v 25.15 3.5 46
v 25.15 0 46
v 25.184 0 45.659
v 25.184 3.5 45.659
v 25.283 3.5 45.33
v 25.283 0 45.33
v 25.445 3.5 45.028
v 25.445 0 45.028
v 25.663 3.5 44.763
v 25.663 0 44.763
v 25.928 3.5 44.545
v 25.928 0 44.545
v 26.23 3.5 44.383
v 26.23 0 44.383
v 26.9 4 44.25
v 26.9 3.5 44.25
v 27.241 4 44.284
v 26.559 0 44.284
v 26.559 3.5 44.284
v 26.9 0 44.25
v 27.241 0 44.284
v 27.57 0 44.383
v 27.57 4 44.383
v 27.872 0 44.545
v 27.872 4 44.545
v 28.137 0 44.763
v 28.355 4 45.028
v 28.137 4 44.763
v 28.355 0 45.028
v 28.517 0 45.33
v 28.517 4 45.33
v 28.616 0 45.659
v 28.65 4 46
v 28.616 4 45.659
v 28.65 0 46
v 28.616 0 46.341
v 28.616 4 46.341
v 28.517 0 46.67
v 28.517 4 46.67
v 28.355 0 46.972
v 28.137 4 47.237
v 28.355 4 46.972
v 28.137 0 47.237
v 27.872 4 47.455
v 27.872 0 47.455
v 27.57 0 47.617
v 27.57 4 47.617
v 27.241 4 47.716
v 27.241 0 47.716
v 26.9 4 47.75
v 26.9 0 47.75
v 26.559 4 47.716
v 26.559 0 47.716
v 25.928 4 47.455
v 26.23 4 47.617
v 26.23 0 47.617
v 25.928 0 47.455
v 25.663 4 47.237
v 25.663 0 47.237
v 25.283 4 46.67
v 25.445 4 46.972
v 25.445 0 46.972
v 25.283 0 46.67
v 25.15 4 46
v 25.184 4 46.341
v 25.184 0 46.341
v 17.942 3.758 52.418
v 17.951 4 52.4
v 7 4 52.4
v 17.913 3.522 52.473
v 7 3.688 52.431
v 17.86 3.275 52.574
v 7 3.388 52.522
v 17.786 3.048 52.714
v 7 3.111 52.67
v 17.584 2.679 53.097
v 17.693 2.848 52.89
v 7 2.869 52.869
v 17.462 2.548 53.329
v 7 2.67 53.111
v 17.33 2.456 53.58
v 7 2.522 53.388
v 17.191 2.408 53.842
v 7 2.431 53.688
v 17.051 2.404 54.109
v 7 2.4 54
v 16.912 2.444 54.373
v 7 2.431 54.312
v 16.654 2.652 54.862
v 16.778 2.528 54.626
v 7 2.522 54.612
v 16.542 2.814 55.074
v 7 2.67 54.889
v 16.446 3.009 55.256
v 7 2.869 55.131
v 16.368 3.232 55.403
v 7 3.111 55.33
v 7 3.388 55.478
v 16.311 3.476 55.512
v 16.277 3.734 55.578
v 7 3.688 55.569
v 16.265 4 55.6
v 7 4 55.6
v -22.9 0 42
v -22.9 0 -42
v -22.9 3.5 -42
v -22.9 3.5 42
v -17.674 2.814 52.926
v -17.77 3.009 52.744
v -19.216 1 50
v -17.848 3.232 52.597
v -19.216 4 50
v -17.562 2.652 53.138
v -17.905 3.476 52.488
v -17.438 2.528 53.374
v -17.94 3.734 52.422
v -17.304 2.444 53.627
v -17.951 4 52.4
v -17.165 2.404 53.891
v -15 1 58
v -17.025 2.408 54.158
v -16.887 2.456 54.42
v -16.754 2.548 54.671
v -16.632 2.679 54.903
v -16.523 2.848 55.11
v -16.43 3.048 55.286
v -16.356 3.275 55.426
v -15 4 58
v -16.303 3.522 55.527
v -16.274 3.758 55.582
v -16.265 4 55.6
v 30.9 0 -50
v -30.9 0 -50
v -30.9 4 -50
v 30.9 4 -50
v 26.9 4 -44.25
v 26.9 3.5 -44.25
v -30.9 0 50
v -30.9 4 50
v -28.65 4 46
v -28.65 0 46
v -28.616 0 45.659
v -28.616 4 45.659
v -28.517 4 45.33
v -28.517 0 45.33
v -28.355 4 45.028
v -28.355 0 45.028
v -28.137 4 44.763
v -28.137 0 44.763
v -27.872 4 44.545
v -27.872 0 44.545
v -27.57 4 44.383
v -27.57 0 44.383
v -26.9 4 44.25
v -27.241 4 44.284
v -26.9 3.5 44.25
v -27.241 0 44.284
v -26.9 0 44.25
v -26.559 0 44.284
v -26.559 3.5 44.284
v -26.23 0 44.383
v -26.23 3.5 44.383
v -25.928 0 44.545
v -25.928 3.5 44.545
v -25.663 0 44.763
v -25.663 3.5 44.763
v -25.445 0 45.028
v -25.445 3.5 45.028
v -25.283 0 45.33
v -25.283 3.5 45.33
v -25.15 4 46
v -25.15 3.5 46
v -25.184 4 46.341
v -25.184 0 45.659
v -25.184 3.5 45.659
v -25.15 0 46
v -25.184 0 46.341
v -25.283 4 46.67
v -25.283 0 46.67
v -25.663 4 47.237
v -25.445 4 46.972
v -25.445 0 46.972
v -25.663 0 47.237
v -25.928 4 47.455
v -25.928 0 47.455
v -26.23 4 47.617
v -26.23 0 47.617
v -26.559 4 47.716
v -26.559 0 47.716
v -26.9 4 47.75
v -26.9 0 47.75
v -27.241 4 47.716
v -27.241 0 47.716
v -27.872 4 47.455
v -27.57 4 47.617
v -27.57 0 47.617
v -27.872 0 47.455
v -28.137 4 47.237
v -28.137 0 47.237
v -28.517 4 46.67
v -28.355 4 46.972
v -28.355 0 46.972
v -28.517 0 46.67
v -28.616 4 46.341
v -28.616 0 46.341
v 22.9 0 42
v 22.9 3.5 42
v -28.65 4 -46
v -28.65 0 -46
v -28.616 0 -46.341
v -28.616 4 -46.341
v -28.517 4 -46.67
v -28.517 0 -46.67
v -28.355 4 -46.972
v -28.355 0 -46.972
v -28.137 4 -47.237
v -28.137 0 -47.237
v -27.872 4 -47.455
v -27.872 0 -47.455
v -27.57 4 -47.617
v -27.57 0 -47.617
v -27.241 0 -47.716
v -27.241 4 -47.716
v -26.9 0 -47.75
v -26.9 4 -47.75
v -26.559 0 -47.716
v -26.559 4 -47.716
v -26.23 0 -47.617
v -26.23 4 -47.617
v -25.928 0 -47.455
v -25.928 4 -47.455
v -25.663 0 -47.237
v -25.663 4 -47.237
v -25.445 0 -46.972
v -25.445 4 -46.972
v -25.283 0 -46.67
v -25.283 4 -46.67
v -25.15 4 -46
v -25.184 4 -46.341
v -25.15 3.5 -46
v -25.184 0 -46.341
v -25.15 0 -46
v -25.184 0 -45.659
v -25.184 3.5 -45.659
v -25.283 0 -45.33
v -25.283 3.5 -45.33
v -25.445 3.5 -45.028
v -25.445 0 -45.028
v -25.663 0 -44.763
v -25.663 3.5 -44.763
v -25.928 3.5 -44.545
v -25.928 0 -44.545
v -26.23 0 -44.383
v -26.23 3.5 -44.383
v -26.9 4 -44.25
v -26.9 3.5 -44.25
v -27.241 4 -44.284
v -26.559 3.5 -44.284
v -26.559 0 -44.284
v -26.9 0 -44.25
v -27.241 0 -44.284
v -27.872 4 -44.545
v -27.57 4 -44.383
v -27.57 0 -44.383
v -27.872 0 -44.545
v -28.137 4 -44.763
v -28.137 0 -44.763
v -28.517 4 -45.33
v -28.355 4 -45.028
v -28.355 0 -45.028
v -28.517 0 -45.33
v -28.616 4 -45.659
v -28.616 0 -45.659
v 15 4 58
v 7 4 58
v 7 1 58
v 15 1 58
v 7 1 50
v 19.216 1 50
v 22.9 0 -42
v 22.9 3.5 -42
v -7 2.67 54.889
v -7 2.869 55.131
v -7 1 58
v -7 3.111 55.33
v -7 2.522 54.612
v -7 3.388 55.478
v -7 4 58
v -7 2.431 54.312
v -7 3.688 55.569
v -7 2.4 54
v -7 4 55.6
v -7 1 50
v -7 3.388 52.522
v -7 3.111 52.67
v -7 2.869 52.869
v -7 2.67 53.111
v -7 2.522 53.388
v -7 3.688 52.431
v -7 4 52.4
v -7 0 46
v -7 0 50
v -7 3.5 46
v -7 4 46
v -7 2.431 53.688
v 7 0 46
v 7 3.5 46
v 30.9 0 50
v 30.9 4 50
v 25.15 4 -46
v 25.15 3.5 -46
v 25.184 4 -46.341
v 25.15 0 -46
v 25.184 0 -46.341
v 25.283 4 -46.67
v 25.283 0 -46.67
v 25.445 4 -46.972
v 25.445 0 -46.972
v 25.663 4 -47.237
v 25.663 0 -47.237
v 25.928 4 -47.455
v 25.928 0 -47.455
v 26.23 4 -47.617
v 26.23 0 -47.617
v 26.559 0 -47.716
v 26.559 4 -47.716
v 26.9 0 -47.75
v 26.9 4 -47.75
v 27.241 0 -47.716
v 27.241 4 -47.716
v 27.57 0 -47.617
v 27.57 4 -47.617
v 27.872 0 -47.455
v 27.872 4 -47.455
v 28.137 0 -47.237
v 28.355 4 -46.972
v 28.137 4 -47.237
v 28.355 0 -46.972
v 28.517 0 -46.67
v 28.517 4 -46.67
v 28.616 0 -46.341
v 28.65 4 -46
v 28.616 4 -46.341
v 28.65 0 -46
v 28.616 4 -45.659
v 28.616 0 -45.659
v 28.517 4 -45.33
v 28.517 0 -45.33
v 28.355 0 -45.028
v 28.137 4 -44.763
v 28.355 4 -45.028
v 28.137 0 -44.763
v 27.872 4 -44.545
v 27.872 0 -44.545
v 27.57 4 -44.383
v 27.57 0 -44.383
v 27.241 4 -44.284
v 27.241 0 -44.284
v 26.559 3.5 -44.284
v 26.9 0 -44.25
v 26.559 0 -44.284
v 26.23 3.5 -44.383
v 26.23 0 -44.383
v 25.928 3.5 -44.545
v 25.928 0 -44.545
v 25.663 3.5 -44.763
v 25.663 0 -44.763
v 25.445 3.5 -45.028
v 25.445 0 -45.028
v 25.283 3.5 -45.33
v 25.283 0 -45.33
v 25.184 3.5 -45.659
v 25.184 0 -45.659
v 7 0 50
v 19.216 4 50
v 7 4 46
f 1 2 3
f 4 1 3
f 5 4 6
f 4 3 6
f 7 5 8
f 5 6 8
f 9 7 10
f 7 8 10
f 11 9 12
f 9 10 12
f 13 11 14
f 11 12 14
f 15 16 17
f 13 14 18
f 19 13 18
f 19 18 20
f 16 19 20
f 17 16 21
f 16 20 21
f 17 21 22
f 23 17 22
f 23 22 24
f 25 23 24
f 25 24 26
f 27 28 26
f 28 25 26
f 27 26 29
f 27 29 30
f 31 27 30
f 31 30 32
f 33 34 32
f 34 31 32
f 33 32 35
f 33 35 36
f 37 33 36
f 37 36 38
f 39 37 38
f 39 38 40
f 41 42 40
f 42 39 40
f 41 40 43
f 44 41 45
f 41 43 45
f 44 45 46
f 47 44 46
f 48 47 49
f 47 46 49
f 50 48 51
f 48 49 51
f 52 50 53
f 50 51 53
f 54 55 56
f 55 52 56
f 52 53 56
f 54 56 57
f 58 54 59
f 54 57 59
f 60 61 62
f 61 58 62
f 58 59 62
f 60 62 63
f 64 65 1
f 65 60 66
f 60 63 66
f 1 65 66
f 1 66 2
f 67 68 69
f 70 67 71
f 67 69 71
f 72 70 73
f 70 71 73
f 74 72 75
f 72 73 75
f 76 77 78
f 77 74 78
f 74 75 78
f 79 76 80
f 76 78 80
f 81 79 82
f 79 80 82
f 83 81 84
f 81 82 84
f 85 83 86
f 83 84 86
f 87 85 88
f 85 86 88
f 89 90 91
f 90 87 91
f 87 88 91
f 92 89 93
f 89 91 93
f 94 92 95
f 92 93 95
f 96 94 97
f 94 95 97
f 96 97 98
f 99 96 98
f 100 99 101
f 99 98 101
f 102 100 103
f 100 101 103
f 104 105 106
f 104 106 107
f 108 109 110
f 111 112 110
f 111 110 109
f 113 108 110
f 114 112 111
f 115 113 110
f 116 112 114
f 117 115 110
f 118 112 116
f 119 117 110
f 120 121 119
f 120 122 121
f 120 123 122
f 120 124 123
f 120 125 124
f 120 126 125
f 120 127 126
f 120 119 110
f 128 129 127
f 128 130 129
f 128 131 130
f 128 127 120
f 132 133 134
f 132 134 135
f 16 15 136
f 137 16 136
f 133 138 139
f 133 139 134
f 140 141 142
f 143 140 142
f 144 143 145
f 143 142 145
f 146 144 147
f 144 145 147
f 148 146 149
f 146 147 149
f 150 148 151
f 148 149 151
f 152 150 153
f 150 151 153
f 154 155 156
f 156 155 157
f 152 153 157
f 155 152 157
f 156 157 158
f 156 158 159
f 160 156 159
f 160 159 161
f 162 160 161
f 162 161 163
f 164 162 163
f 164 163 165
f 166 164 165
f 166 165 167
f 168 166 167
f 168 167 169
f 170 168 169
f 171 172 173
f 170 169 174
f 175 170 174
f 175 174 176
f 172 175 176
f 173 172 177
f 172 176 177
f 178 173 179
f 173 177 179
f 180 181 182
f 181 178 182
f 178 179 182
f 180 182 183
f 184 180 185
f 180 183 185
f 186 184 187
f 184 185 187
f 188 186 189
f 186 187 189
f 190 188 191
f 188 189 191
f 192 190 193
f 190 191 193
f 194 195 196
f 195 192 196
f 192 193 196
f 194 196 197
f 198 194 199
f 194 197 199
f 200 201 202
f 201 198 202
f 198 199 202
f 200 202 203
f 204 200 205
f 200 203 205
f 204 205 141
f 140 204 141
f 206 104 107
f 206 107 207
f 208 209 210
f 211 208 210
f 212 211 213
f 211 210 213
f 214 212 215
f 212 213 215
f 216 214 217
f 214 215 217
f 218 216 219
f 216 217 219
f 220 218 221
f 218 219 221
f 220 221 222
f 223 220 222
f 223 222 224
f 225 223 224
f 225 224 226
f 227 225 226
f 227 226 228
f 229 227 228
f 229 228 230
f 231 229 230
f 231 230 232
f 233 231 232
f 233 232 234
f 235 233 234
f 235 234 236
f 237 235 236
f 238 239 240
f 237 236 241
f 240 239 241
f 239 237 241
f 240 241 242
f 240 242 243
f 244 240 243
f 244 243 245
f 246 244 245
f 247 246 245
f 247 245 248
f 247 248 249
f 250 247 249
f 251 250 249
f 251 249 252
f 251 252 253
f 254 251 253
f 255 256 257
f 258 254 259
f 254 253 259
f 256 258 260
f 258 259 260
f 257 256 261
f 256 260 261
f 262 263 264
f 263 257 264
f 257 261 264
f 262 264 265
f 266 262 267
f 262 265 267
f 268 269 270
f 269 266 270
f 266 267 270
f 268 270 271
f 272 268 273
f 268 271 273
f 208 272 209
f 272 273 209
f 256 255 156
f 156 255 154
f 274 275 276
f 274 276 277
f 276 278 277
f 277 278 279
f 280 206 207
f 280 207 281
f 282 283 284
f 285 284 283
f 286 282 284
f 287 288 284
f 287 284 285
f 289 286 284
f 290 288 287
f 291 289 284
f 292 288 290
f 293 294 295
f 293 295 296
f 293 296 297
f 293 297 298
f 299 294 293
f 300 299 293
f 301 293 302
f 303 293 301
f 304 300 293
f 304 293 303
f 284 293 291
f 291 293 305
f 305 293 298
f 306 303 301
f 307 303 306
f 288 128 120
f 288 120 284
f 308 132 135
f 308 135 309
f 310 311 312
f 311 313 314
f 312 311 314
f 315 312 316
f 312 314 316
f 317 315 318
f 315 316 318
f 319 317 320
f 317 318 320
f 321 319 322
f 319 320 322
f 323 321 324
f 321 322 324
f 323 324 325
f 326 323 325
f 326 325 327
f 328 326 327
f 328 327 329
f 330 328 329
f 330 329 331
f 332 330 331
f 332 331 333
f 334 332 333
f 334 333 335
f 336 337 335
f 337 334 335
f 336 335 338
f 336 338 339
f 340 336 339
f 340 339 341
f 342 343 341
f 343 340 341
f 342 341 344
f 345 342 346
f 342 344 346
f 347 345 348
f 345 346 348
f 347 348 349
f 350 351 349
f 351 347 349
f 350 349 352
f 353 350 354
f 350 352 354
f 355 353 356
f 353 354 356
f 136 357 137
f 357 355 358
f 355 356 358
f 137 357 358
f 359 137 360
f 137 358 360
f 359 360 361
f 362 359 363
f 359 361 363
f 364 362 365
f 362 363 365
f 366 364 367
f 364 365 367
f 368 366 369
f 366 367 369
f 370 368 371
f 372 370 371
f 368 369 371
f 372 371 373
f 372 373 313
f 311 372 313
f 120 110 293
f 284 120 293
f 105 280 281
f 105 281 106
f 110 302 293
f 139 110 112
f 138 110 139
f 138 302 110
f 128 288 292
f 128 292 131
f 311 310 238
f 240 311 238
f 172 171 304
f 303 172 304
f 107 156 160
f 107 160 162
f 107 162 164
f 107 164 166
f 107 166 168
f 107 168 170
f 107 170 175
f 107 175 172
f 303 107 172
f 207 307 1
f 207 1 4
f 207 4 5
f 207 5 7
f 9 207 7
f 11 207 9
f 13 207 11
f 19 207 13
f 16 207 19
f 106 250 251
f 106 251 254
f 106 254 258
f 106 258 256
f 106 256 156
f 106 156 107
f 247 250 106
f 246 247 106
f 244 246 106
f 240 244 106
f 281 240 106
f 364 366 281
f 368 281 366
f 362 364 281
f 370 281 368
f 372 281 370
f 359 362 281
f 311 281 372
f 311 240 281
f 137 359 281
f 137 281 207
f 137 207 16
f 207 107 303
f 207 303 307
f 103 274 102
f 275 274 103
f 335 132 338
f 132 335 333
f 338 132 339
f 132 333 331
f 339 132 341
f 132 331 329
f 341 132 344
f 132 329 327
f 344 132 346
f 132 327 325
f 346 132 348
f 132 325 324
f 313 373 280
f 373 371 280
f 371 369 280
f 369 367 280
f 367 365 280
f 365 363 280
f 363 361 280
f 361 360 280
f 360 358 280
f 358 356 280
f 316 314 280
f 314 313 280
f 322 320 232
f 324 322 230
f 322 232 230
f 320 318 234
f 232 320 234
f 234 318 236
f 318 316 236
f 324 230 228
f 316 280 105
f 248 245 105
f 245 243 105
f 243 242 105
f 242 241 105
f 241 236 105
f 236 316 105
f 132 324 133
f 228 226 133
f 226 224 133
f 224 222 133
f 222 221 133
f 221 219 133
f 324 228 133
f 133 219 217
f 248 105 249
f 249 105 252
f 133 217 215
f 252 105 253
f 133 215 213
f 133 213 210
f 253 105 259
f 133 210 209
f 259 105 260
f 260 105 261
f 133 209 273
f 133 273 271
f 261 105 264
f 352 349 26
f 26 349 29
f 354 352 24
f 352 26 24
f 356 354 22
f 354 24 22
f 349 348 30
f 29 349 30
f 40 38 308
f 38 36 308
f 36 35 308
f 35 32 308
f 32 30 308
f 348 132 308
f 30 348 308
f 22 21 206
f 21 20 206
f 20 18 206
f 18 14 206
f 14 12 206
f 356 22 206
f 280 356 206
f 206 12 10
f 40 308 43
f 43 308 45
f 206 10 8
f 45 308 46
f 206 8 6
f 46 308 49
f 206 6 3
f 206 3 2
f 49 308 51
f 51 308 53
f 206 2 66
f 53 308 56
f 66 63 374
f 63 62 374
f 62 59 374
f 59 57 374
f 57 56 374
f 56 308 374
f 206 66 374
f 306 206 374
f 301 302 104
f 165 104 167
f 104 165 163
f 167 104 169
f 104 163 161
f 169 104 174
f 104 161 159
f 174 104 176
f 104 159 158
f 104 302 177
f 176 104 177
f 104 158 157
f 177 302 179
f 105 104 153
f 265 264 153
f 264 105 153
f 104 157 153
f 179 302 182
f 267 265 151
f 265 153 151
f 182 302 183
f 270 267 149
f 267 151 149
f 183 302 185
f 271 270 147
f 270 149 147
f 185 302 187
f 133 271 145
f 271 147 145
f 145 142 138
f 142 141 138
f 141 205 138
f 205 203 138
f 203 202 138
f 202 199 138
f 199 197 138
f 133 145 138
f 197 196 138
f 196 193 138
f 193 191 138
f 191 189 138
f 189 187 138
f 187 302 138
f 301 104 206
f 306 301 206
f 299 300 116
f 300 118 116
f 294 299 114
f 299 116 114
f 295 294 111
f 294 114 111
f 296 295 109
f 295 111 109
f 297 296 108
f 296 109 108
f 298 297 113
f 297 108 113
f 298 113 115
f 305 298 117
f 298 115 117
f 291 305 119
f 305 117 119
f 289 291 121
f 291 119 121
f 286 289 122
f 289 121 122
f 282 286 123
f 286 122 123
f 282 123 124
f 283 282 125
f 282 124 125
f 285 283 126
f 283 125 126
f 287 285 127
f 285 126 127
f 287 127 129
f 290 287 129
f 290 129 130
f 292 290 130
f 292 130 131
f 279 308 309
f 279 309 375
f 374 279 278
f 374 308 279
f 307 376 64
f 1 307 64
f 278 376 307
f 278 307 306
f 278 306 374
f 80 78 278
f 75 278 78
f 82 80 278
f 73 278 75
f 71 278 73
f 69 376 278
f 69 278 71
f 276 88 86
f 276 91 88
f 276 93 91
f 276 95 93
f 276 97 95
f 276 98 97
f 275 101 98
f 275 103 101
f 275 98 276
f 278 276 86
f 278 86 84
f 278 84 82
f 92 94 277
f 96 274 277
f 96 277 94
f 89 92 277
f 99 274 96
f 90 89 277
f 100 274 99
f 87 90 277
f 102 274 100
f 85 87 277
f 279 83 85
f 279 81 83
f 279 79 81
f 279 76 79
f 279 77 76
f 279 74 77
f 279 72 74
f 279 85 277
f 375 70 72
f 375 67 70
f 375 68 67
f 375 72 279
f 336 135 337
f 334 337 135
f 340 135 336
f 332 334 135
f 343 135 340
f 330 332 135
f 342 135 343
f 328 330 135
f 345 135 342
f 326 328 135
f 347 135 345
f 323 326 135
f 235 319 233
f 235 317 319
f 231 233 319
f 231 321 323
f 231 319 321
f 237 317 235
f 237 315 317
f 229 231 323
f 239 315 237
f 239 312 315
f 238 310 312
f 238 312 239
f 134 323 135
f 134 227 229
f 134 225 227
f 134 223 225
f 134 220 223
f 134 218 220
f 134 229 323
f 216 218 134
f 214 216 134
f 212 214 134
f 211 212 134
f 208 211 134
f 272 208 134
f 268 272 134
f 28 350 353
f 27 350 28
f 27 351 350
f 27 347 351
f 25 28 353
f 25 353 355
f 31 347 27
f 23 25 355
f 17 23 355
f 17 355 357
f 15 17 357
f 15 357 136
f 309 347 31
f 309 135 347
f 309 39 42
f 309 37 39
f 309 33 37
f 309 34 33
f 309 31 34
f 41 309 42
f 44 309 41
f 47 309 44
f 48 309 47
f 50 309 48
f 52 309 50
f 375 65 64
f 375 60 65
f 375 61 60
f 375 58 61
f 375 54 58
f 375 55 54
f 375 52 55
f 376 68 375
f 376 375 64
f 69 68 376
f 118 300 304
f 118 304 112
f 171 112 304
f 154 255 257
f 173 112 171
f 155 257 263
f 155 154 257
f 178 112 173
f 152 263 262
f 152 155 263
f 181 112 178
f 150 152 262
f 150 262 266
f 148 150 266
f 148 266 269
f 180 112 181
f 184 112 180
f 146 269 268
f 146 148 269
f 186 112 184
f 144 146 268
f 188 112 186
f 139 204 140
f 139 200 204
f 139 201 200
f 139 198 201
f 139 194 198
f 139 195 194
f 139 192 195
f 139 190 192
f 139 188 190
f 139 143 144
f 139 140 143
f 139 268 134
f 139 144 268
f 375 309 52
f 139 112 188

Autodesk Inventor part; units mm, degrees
ref_plane "YZ Plane" through (0, 0, 0) normal (1, 0, 0) x (0, 1, 0)
ref_plane "XZ Plane" through (0, 0, 0) normal (0, 1, 0) x (-1, 0, 0)
ref_plane "XY Plane" through (0, 0, 0) normal (0, 0, 1) x (1, 0, 0)
sketch "草图1" plane through (0, 0, 0) normal (0, 1, 0) x (-1, 0, 0)
  line L0 (30.9, 50) -> (30.9, -50)
  line L1 (30.9, -50) -> (-30.9, -50)
  line L2 (-30.9, -50) -> (-30.9, 50)
  line L3 (-30.9, 50) -> (30.9, 50)
  line L4 (0, 0) -> (5.4307, 0)
  line L5 (0, 0) -> (0, 9.1176)
  line L6 (22.9, 42) -> (-22.9, 42)
  line L7 (-22.9, 42) -> (-22.9, -42)
  line L8 (-22.9, -42) -> (22.9, -42)
  line L9 (22.9, -42) -> (22.9, 42)
  circle A0 centre (26.9, 46) radius 1.75
  circle A1 centre (26.9, -46) radius 1.75
  circle A2 centre (-26.9, 46) radius 1.75
  circle A3 centre (-26.9, -46) radius 1.75
  dimension "d0" = 100
  dimension "d1" = 61.8
  dimension "d2" = 8
  dimension "d3" = 8
  dimension "d4" = 3.5
  dimension "d5" = 4
  dimension "d6" = 4
  dimension "d9" = 92
  dimension "d12" = 53.8
extrude "拉伸1" add sketch "草图1" along normal blind 4
sketch "草图2" plane through (0, 4, 0) normal (0, 1, 0) x (1, 0, 0)
  line L0 (-30.9, -50) -> (30.9, -50) construction
  line L1 (-19.2161, -50) -> (-15, -58)
  line L2 (-15, -58) -> (15, -58)
  line L3 (15, -58) -> (19.2161, -50)
  line L4 (0, 0) -> (0, -17.0054)
  line L5 (-19.2161, -50) -> (19.2161, -50)
  dimension "d17" = 8
  dimension "d18" = 30
extrude "拉伸2" add sketch "草图2" against normal blind 3
sketch "草图3" plane through (0, 0, 0) normal (1, 0, 0) x (0, 1, 0)
  line L0 (4, 50) -> (4, 58) construction
  circle A0 centre (4, 54) radius 1.6
  point P0 (0, 0)
  dimension "d21" = 3.2
extrude "拉伸3" cut sketch "草图3" along normal mid plane 40
sketch "草图4" plane through (0, 4, 0) normal (0, 1, 0) x (1, 0, 0)
  line L0 (15, -58) -> (-15, -58) construction
  line L1 (-7, -58) -> (-7, -46)
  line L2 (-7, -46) -> (7, -46)
  line L3 (-30.9, -50) -> (30.9, -50) projected
  line L4 (7, -46) -> (7, -58)
  line L5 (7, -58) -> (-7, -58)
  line L6 (0, 0) -> (0, -70.1982)
  dimension "d26" = 12
  dimension "d27" = 14
extrude "拉伸4" cut sketch "草图4" against normal blind 40
sketch "草图5" plane through (0, 4, 0) normal (0, 1, 0) x (1, 0, 0)
  circle A0 centre (-26.9, -46) radius 1.75 projected
  circle A1 centre (26.9, 46) radius 1.75 projected
  line L0 (-26.9, -46) -> (26.9, -46)
  line L1 (26.9, -46) -> (26.9, 46)
  line L2 (26.9, 46) -> (-26.9, 46)
  line L3 (-26.9, 46) -> (-26.9, -46)
  point P0 (0, 0)
extrude "拉伸5" cut sketch "草图5" against normal blind 0.5 contours L0 L3 A0 | A0 L3 L2 A1 L1 L0 | A1 L2 L1 picked at (-26.2832, -45.0184) picked at (25.748, 45.8702)
properties part number "筛网"
